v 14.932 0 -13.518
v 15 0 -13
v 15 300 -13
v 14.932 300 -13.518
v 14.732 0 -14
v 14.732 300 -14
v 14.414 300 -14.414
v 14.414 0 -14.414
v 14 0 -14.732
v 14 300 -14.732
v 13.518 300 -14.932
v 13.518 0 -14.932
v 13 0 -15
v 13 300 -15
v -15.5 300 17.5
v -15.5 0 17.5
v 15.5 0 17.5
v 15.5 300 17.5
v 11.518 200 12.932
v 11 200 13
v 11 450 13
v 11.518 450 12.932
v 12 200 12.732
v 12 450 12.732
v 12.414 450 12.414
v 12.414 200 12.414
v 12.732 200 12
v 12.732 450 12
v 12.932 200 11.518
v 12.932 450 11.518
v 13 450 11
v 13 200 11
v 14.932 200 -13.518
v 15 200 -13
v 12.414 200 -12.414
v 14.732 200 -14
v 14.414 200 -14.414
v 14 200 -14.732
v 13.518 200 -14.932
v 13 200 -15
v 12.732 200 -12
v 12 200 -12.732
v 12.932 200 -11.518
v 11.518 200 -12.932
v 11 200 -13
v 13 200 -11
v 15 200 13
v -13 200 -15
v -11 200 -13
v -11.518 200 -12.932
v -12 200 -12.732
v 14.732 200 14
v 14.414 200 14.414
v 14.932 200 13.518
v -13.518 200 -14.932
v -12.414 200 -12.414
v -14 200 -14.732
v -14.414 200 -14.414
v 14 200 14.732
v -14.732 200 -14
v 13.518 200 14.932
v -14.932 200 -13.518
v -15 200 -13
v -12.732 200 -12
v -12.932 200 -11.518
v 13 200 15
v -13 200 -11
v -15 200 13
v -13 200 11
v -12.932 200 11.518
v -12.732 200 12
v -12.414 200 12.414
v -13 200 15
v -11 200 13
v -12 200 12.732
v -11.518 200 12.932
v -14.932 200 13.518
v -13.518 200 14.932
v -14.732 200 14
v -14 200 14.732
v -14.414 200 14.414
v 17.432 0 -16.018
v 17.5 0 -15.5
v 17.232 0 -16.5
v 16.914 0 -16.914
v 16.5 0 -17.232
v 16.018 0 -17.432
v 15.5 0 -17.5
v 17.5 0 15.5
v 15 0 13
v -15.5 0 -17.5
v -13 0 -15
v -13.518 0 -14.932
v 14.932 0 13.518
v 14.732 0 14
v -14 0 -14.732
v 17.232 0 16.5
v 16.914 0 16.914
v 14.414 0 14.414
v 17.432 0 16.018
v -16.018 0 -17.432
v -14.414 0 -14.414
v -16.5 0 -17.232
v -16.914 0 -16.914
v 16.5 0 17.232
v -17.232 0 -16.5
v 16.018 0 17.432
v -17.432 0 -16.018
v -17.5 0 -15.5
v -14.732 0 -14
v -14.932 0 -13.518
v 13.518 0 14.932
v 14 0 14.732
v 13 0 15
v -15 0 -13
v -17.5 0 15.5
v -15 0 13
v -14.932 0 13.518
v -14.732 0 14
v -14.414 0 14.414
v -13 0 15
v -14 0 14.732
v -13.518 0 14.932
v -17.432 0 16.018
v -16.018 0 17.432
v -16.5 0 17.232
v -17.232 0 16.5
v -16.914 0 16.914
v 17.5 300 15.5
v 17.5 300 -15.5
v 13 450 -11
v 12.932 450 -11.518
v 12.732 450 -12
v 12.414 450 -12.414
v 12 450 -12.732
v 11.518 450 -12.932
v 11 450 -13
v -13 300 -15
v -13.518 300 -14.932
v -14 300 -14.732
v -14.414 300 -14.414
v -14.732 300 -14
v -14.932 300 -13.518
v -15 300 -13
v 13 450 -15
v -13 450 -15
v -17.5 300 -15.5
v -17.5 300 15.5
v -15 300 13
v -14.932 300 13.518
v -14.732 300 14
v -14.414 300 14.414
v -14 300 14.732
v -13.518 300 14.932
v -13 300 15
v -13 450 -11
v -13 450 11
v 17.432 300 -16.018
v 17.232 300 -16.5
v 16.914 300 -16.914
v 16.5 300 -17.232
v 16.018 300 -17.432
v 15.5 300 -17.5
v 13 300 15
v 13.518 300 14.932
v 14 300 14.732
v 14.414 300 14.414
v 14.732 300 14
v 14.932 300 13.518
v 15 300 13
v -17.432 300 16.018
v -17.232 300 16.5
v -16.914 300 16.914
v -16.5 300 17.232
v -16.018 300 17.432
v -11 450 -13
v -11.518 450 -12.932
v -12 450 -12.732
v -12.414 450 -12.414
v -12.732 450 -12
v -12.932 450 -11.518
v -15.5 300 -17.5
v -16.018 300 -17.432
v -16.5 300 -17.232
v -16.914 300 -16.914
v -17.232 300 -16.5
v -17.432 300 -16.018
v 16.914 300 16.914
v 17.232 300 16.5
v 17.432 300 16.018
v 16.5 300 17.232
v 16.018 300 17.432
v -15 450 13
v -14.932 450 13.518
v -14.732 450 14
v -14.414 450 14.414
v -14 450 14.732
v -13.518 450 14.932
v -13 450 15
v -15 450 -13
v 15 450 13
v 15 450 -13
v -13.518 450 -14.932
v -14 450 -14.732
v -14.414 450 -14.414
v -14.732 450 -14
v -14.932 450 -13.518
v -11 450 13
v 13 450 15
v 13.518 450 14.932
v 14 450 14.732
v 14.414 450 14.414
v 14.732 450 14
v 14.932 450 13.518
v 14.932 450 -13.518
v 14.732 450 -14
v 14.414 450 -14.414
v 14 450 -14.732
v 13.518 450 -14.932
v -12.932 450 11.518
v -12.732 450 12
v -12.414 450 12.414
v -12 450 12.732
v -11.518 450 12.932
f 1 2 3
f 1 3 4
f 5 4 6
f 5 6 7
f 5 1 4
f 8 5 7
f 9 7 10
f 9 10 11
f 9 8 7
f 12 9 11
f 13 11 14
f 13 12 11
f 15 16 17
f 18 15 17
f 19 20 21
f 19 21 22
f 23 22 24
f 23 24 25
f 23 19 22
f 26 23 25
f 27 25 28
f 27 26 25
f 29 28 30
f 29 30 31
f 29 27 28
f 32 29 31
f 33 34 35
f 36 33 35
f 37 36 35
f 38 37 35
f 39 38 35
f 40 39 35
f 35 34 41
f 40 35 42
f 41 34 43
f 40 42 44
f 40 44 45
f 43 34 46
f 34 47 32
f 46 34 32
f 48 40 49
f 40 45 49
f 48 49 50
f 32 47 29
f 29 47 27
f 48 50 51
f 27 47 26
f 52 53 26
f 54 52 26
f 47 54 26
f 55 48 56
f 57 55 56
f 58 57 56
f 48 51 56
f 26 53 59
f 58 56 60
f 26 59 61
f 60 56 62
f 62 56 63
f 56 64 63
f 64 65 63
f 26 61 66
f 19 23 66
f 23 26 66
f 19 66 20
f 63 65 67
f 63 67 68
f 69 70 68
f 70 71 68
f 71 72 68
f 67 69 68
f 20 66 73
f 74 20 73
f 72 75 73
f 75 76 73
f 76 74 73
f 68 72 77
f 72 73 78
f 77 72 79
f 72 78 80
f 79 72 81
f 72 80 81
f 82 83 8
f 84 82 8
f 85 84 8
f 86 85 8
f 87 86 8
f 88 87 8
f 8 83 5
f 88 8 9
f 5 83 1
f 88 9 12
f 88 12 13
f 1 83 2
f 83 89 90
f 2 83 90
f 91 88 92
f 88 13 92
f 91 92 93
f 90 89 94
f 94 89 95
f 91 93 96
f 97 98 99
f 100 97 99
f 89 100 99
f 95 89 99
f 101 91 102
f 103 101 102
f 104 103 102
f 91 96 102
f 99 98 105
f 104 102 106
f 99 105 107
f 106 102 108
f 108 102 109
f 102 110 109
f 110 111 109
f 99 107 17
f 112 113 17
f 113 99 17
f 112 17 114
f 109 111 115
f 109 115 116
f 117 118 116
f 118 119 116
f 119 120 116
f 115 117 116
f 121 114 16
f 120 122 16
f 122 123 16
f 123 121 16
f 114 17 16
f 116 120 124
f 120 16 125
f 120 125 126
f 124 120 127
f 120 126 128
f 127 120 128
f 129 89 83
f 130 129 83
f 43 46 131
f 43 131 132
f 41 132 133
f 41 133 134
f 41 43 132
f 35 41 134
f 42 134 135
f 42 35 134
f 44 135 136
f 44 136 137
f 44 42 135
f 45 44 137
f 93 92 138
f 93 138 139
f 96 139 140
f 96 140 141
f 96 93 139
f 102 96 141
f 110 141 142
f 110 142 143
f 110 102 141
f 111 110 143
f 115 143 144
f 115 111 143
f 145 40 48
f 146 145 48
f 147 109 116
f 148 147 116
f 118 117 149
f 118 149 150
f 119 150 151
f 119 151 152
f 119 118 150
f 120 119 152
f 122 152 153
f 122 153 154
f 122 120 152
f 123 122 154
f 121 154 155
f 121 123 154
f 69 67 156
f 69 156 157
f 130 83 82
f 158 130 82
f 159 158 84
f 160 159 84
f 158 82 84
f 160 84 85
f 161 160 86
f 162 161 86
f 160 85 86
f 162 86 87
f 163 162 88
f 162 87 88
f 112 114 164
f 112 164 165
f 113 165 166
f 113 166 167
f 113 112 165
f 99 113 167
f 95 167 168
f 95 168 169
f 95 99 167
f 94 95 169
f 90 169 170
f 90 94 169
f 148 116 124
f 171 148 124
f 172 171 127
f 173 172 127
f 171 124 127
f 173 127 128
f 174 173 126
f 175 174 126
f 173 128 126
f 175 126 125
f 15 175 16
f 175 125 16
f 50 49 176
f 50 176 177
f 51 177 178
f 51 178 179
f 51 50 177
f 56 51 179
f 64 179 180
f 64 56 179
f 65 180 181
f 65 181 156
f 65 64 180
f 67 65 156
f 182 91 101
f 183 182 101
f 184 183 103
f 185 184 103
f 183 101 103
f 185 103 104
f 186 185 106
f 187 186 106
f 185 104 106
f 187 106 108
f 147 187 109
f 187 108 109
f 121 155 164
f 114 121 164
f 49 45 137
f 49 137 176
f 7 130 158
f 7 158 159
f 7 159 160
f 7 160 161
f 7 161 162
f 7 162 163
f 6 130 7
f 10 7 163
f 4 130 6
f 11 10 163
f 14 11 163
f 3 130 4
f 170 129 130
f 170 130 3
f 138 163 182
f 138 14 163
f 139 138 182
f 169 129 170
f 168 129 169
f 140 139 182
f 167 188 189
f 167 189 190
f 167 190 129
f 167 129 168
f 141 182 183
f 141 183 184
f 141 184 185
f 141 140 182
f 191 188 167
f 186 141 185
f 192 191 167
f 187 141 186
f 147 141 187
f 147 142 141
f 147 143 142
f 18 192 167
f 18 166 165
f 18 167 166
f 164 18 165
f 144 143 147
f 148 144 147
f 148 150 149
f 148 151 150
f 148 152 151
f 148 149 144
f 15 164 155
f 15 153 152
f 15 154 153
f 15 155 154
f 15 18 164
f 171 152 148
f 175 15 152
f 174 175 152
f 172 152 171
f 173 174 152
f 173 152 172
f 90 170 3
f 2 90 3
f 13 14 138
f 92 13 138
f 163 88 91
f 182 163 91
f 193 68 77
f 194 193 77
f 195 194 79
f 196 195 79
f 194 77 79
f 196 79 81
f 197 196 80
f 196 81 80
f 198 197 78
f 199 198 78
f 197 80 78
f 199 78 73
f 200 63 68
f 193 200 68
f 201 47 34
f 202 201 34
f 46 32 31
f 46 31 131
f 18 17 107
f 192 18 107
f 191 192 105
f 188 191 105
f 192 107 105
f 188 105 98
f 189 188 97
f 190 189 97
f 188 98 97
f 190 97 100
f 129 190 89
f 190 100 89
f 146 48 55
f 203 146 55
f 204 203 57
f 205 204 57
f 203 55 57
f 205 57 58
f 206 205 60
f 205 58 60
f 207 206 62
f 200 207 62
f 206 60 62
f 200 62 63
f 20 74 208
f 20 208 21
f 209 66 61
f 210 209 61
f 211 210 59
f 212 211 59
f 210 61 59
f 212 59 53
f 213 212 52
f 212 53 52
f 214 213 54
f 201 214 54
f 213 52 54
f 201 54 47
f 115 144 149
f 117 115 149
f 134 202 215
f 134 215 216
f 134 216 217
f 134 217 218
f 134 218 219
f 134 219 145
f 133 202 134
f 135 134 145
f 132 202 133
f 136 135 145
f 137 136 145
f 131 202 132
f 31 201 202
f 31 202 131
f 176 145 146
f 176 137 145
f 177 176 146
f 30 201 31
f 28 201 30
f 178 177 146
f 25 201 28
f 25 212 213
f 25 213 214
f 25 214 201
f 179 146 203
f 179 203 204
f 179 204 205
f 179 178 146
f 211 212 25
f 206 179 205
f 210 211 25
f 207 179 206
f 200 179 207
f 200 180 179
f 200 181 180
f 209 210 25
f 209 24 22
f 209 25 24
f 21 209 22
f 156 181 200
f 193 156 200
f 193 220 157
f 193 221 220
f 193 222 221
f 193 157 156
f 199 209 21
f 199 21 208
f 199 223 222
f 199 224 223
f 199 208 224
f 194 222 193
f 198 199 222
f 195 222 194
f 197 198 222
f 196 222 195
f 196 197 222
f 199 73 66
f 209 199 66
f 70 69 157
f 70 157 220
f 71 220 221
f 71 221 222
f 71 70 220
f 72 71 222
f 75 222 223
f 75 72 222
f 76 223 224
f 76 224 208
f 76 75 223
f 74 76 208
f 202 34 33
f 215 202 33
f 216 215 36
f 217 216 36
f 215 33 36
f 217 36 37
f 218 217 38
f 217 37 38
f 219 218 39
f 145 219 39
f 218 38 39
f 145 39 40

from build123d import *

# Parameters (mm, degrees)
CUSTOM_TUBE_CARRE_35_2_5_1_DEPTH = 300
CUSTOM_TUBE_CARRE_30_2_1_DEPTH   = 250


with BuildPart() as part:
    # Esquisse11 → Custom TUBE-CARRE-35-2.5(1) (new body)
    with BuildSketch(Plane(origin=(0, 0, 0), x_dir=(-1, 0, 0), z_dir=(0, 1, 0))):
        with BuildLine():
            Line((-15.5, -17.5), (15.5, -17.5))
            ThreePointArc((15.5, -17.5), (16.914213562, -16.914213562), (17.5, -15.5))
            Line((17.5, -15.5), (17.5, 15.5))
            ThreePointArc((17.5, 15.5), (16.914213562, 16.914213562), (15.5, 17.5))
            Line((15.5, 17.5), (-15.5, 17.5))
            ThreePointArc((-15.5, 17.5), (-16.914213562, 16.914213562), (-17.5, 15.5))
            Line((-17.5, 15.5), (-17.5, -15.5))
            ThreePointArc((-17.5, -15.5), (-16.914213562, -16.914213562), (-15.5, -17.5))
        make_face()
        with BuildLine():
            Line((-13, -15), (13, -15))
            ThreePointArc((13, -15), (14.414213562, -14.414213562), (15, -13))
            Line((15, -13), (15, 13))
            ThreePointArc((15, 13), (14.414213562, 14.414213562), (13, 15))
            Line((13, 15), (-13, 15))
            ThreePointArc((-13, 15), (-14.414213562, 14.414213562), (-15, 13))
            Line((-15, 13), (-15, -13))
            ThreePointArc((-15, -13), (-14.414213562, -14.414213562), (-13, -15))
        make_face(mode=Mode.SUBTRACT)
    extrude(amount=CUSTOM_TUBE_CARRE_35_2_5_1_DEPTH)


with BuildPart() as body_2:
    # Esquisse12 → Custom TUBE-CARRE-30-2(1) (new body)
    with BuildSketch(Plane(origin=(0, 200, 0), x_dir=(-1, 0, 0), z_dir=(0, 1, 0))):
        with BuildLine():
            Line((-13, -15), (13, -15))
            ThreePointArc((13, -15), (14.414213562, -14.414213562), (15, -13))
            Line((15, -13), (15, 13))
            ThreePointArc((15, 13), (14.414213562, 14.414213562), (13, 15))
            Line((13, 15), (-13, 15))
            ThreePointArc((-13, 15), (-14.414213562, 14.414213562), (-15, 13))
            Line((-15, 13), (-15, -13))
            ThreePointArc((-15, -13), (-14.414213562, -14.414213562), (-13, -15))
        make_face()
        with BuildLine():
            Line((-11, -13), (11, -13))
            ThreePointArc((11, -13), (12.414213562, -12.414213562), (13, -11))
            Line((13, -11), (13, 11))
            ThreePointArc((13, 11), (12.414213562, 12.414213562), (11, 13))
            Line((11, 13), (-11, 13))
            ThreePointArc((-11, 13), (-12.414213562, 12.414213562), (-13, 11))
            Line((-13, 11), (-13, -11))
            ThreePointArc((-13, -11), (-12.414213562, -12.414213562), (-11, -13))
        make_face(mode=Mode.SUBTRACT)
    extrude(amount=CUSTOM_TUBE_CARRE_30_2_1_DEPTH)


solid = Compound([part.part, body_2.part])
